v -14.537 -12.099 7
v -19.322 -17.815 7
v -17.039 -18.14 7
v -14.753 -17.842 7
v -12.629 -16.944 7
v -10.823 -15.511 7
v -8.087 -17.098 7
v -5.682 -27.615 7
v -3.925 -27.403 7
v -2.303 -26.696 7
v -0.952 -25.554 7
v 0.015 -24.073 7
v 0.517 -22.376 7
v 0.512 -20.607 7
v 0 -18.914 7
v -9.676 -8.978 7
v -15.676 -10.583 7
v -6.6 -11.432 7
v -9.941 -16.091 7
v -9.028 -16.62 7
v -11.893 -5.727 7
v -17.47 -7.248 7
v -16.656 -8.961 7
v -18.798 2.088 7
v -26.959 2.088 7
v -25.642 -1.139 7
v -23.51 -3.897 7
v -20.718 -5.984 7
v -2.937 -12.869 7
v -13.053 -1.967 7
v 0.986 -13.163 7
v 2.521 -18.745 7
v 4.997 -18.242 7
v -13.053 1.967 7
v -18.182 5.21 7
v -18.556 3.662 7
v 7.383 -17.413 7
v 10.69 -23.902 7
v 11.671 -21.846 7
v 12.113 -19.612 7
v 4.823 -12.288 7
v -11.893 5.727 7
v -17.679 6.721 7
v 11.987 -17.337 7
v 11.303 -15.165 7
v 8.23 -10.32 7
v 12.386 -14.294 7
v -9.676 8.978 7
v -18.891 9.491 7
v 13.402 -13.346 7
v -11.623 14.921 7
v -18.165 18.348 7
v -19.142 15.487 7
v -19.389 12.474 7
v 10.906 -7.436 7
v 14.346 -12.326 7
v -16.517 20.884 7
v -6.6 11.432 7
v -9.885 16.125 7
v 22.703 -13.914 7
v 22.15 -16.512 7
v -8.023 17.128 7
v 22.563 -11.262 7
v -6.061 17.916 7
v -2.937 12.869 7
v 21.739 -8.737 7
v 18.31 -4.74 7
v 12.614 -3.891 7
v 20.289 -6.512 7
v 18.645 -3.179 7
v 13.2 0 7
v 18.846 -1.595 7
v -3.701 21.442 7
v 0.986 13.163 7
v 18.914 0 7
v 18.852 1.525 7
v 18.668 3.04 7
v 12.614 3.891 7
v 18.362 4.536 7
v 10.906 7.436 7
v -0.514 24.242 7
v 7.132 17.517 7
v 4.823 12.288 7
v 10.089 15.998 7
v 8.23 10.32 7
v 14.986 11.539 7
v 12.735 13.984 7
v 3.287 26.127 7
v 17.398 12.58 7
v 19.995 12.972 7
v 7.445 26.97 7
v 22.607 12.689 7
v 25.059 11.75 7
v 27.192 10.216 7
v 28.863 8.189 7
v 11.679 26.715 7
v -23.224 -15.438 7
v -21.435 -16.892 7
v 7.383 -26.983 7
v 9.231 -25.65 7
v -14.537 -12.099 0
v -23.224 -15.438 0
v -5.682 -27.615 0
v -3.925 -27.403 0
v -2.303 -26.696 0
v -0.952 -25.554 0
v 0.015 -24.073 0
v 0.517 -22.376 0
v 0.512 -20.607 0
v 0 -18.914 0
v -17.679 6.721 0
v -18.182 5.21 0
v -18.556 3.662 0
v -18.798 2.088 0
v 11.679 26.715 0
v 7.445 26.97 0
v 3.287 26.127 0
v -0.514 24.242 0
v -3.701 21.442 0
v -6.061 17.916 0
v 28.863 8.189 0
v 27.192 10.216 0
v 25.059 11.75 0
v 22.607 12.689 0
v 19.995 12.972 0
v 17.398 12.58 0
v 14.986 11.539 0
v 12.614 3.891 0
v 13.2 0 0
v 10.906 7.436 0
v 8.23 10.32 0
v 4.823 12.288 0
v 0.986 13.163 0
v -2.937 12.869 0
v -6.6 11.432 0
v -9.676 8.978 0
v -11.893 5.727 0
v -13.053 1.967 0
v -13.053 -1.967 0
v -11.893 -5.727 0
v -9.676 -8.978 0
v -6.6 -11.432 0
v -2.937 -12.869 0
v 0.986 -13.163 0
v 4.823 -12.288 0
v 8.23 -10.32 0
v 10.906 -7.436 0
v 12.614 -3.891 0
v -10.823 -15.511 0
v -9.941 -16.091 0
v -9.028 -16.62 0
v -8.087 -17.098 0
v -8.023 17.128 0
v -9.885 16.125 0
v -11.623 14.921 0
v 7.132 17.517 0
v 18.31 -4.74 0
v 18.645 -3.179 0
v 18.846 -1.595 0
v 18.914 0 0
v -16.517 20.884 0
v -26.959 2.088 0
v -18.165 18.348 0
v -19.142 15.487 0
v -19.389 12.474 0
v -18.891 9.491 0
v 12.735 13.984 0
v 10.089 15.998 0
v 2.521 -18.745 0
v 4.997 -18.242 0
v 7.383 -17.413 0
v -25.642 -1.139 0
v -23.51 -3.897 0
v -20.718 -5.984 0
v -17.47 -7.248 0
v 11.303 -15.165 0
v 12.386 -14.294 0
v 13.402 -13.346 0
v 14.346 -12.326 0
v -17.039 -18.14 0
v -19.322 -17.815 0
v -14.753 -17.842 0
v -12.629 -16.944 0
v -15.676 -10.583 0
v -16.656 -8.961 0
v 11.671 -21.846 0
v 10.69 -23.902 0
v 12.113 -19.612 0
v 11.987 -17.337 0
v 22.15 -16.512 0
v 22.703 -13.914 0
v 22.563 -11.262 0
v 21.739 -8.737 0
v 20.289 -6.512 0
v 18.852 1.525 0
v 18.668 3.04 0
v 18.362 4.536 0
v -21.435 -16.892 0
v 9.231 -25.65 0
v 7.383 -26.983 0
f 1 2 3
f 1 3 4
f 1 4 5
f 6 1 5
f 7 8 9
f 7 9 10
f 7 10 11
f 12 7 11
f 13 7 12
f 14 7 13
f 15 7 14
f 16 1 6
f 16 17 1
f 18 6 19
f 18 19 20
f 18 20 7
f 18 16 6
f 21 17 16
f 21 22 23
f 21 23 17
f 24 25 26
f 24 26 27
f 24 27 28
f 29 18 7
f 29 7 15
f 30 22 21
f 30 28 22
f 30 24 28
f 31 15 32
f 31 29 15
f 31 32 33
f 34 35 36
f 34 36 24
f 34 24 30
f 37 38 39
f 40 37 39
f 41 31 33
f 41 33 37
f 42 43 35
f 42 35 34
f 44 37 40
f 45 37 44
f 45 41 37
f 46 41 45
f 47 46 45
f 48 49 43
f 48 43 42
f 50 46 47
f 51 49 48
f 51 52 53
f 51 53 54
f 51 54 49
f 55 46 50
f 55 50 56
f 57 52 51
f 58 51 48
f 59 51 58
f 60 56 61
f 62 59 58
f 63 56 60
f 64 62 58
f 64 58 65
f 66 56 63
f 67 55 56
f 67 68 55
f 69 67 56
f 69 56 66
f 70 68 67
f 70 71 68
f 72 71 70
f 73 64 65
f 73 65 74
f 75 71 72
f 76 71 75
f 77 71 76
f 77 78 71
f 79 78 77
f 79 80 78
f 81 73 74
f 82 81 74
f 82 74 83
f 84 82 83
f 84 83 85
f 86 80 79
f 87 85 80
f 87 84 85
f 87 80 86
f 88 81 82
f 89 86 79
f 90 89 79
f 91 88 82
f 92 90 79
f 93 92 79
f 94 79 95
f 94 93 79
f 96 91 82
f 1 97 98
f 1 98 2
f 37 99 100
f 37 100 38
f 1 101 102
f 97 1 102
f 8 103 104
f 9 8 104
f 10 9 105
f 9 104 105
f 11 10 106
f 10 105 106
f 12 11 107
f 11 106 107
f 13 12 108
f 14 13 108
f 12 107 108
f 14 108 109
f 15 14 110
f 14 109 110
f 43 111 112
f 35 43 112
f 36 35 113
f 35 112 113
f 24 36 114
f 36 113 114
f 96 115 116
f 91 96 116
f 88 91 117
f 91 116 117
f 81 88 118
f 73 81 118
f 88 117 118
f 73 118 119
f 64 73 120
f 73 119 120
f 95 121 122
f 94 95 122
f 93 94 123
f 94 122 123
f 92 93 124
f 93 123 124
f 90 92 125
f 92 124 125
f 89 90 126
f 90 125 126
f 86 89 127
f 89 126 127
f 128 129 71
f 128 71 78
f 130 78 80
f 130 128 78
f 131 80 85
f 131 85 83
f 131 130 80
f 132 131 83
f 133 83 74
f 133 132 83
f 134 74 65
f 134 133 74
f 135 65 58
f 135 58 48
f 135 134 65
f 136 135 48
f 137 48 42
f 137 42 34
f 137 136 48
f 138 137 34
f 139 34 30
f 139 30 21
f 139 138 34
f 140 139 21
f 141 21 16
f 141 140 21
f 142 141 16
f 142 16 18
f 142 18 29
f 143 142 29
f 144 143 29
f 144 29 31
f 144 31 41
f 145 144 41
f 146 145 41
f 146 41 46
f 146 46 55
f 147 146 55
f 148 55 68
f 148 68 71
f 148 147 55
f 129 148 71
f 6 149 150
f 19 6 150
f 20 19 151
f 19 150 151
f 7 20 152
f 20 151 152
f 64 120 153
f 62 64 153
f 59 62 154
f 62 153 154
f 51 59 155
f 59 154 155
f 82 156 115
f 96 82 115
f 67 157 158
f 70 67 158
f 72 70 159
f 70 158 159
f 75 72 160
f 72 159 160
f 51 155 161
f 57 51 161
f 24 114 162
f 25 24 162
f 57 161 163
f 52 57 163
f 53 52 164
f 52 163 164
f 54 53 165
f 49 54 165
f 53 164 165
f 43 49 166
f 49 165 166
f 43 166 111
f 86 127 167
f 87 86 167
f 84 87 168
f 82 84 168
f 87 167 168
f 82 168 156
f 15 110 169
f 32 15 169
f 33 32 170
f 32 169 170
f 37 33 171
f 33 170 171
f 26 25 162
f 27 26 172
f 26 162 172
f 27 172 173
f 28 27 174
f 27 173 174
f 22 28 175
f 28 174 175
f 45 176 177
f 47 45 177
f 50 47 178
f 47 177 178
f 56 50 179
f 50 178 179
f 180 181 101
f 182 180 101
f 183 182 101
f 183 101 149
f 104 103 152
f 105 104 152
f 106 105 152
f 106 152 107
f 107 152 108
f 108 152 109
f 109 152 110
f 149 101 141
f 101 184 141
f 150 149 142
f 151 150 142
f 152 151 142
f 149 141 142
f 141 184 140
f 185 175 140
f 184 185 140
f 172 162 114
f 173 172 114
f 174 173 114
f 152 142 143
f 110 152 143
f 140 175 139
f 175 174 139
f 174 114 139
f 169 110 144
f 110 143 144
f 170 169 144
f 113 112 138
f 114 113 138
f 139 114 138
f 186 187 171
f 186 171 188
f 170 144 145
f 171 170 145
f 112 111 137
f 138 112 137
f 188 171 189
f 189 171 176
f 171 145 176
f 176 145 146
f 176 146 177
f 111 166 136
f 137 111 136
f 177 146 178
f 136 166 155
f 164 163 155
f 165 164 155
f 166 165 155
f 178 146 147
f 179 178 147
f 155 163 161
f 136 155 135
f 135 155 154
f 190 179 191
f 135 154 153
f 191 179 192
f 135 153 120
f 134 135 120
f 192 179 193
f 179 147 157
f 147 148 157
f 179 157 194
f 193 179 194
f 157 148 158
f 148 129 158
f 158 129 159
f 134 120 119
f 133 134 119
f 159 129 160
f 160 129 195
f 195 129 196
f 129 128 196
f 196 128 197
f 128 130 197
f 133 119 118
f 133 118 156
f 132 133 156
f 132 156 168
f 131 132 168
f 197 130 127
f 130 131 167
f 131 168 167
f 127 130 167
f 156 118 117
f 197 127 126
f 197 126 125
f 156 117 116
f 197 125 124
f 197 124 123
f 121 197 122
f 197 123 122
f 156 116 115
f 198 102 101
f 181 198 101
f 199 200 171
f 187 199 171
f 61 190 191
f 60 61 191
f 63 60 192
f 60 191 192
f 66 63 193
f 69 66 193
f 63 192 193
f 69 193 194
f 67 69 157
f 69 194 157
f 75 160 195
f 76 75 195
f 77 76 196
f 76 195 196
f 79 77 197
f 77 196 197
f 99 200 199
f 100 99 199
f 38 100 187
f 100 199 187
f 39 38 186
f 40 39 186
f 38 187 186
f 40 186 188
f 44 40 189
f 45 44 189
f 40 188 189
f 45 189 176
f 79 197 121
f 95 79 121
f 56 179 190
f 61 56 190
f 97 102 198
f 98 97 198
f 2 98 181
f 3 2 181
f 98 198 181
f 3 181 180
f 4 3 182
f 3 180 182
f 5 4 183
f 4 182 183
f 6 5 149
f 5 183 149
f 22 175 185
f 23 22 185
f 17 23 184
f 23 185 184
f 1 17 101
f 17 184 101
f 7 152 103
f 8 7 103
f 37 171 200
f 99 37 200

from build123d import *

# Parameters (mm, degrees)
F0_R     = 13.2
F1_DEPTH = 7


with BuildPart() as f1:
    # F0 (on Top) → F1 (new body)
    with BuildSketch(Plane.XY):
        with BuildLine():
            ThreePointArc((18.310132, -4.740264), (18.76226, -2.389272), (18.913779, 0))
            ThreePointArc((18.913779, 0), (18.775293, 2.284599), (18.361864, 4.535742))
            ThreePointArc((18.361864, 4.535742), (17.037777, 8.212501), (14.986336, 11.538663))
            ThreePointArc((14.986336, 11.538663), (11.456299, 15.049393), (7.13248, 17.517384))
            ThreePointArc((7.13248, 17.517384), (0.571768, 18.905134), (-6.060819, 17.916403))
            ThreePointArc((-6.060819, 17.916403), (-8.967974, 16.652521), (-11.623212, 14.920857))
            ThreePointArc((-11.623212, 14.920857), (-15.214001, 11.236778), (-17.679205, 6.721363))
            ThreePointArc((-17.679205, 6.721363), (-18.38519, 4.440249), (-18.798132, 2.088361))
            ThreePointArc((-18.798132, 2.088361), (-18.725211, -2.664116), (-17.469759, -7.248349))
            ThreePointArc((-17.469759, -7.248349), (-16.186317, -9.784385), (-14.537336, -12.099458))
            ThreePointArc((-14.537336, -12.099458), (-12.794361, -13.929657), (-10.822932, -15.51113))
            ThreePointArc((-10.822932, -15.51113), (-9.4883, -16.361638), (-8.087237, -17.097591))
            ThreePointArc((-8.087237, -17.097591), (-4.144332, -18.454147), (0, -18.913779))
            ThreePointArc((0, -18.913779), (3.76722, -18.534807), (7.383474, -17.41308))
            ThreePointArc((7.383474, -17.41308), (9.410528, -16.406492), (11.302837, -15.164989))
            ThreePointArc((11.302837, -15.164989), (12.902521, -13.829533), (14.345584, -12.326202))
            ThreePointArc((14.345584, -12.326202), (16.762624, -8.760449), (18.310132, -4.740264))
        make_face()
        Circle(F0_R, mode=Mode.SUBTRACT)
        with BuildLine():
            ThreePointArc((14.986336, 11.538663), (17.037777, 8.212501), (18.361864, 4.535742))
            Line((18.361864, 4.535742), (28.862666, 8.188942))
            ThreePointArc((28.862666, 8.188942), (22.606509, 12.689041), (14.986336, 11.538663))
        make_face()
        with BuildLine():
            ThreePointArc((22.15042, -16.512131), (22.234177, -9.972473), (18.310132, -4.740264))
            ThreePointArc((18.310132, -4.740264), (16.762624, -8.760449), (14.345584, -12.326202))
            Line((14.345584, -12.326202), (22.15042, -16.512131))
        make_face()
        with BuildLine():
            ThreePointArc((-6.060819, 17.916403), (0.571768, 18.905134), (7.13248, 17.517384))
            Line((7.13248, 17.517384), (11.679311, 26.714748))
            ThreePointArc((11.679311, 26.714748), (1.325059, 25.308147), (-6.060819, 17.916403))
        make_face()
        with BuildLine():
            ThreePointArc((7.383474, -26.983239), (11.671181, -21.846172), (11.302837, -15.164989))
            ThreePointArc((11.302837, -15.164989), (9.410528, -16.406492), (7.383474, -17.41308))
            Line((7.383474, -17.41308), (7.383474, -26.983239))
        make_face()
        with BuildLine():
            ThreePointArc((-17.679205, 6.721363), (-15.214001, 11.236778), (-11.623212, 14.920857))
            Line((-11.623212, 14.920857), (-16.517041, 20.883616))
            ThreePointArc((-16.517041, 20.883616), (-19.358616, 13.987987), (-17.679205, 6.721363))
        make_face()
        with BuildLine():
            ThreePointArc((-5.681629, -27.615353), (-0.414558, -24.848773), (0, -18.913779))
            ThreePointArc((0, -18.913779), (-4.144332, -18.454147), (-8.087237, -17.097591))
            Line((-8.087237, -17.097591), (-5.681629, -27.615353))
        make_face()
        with BuildLine():
            ThreePointArc((-17.469759, -7.248349), (-18.725211, -2.664116), (-18.798132, 2.088361))
            Line((-18.798132, 2.088361), (-26.958849, 2.088361))
            ThreePointArc((-26.958849, 2.088361), (-23.510173, -3.897012), (-17.469759, -7.248349))
        make_face()
        with BuildLine():
            ThreePointArc((-23.224378, -15.438171), (-17.039334, -18.139689), (-10.822932, -15.51113))
            ThreePointArc((-10.822932, -15.51113), (-12.794361, -13.929657), (-14.537336, -12.099458))
            Line((-14.537336, -12.099458), (-23.224378, -15.438171))
        make_face()
    extrude(amount=F1_DEPTH)


solid = f1.part
